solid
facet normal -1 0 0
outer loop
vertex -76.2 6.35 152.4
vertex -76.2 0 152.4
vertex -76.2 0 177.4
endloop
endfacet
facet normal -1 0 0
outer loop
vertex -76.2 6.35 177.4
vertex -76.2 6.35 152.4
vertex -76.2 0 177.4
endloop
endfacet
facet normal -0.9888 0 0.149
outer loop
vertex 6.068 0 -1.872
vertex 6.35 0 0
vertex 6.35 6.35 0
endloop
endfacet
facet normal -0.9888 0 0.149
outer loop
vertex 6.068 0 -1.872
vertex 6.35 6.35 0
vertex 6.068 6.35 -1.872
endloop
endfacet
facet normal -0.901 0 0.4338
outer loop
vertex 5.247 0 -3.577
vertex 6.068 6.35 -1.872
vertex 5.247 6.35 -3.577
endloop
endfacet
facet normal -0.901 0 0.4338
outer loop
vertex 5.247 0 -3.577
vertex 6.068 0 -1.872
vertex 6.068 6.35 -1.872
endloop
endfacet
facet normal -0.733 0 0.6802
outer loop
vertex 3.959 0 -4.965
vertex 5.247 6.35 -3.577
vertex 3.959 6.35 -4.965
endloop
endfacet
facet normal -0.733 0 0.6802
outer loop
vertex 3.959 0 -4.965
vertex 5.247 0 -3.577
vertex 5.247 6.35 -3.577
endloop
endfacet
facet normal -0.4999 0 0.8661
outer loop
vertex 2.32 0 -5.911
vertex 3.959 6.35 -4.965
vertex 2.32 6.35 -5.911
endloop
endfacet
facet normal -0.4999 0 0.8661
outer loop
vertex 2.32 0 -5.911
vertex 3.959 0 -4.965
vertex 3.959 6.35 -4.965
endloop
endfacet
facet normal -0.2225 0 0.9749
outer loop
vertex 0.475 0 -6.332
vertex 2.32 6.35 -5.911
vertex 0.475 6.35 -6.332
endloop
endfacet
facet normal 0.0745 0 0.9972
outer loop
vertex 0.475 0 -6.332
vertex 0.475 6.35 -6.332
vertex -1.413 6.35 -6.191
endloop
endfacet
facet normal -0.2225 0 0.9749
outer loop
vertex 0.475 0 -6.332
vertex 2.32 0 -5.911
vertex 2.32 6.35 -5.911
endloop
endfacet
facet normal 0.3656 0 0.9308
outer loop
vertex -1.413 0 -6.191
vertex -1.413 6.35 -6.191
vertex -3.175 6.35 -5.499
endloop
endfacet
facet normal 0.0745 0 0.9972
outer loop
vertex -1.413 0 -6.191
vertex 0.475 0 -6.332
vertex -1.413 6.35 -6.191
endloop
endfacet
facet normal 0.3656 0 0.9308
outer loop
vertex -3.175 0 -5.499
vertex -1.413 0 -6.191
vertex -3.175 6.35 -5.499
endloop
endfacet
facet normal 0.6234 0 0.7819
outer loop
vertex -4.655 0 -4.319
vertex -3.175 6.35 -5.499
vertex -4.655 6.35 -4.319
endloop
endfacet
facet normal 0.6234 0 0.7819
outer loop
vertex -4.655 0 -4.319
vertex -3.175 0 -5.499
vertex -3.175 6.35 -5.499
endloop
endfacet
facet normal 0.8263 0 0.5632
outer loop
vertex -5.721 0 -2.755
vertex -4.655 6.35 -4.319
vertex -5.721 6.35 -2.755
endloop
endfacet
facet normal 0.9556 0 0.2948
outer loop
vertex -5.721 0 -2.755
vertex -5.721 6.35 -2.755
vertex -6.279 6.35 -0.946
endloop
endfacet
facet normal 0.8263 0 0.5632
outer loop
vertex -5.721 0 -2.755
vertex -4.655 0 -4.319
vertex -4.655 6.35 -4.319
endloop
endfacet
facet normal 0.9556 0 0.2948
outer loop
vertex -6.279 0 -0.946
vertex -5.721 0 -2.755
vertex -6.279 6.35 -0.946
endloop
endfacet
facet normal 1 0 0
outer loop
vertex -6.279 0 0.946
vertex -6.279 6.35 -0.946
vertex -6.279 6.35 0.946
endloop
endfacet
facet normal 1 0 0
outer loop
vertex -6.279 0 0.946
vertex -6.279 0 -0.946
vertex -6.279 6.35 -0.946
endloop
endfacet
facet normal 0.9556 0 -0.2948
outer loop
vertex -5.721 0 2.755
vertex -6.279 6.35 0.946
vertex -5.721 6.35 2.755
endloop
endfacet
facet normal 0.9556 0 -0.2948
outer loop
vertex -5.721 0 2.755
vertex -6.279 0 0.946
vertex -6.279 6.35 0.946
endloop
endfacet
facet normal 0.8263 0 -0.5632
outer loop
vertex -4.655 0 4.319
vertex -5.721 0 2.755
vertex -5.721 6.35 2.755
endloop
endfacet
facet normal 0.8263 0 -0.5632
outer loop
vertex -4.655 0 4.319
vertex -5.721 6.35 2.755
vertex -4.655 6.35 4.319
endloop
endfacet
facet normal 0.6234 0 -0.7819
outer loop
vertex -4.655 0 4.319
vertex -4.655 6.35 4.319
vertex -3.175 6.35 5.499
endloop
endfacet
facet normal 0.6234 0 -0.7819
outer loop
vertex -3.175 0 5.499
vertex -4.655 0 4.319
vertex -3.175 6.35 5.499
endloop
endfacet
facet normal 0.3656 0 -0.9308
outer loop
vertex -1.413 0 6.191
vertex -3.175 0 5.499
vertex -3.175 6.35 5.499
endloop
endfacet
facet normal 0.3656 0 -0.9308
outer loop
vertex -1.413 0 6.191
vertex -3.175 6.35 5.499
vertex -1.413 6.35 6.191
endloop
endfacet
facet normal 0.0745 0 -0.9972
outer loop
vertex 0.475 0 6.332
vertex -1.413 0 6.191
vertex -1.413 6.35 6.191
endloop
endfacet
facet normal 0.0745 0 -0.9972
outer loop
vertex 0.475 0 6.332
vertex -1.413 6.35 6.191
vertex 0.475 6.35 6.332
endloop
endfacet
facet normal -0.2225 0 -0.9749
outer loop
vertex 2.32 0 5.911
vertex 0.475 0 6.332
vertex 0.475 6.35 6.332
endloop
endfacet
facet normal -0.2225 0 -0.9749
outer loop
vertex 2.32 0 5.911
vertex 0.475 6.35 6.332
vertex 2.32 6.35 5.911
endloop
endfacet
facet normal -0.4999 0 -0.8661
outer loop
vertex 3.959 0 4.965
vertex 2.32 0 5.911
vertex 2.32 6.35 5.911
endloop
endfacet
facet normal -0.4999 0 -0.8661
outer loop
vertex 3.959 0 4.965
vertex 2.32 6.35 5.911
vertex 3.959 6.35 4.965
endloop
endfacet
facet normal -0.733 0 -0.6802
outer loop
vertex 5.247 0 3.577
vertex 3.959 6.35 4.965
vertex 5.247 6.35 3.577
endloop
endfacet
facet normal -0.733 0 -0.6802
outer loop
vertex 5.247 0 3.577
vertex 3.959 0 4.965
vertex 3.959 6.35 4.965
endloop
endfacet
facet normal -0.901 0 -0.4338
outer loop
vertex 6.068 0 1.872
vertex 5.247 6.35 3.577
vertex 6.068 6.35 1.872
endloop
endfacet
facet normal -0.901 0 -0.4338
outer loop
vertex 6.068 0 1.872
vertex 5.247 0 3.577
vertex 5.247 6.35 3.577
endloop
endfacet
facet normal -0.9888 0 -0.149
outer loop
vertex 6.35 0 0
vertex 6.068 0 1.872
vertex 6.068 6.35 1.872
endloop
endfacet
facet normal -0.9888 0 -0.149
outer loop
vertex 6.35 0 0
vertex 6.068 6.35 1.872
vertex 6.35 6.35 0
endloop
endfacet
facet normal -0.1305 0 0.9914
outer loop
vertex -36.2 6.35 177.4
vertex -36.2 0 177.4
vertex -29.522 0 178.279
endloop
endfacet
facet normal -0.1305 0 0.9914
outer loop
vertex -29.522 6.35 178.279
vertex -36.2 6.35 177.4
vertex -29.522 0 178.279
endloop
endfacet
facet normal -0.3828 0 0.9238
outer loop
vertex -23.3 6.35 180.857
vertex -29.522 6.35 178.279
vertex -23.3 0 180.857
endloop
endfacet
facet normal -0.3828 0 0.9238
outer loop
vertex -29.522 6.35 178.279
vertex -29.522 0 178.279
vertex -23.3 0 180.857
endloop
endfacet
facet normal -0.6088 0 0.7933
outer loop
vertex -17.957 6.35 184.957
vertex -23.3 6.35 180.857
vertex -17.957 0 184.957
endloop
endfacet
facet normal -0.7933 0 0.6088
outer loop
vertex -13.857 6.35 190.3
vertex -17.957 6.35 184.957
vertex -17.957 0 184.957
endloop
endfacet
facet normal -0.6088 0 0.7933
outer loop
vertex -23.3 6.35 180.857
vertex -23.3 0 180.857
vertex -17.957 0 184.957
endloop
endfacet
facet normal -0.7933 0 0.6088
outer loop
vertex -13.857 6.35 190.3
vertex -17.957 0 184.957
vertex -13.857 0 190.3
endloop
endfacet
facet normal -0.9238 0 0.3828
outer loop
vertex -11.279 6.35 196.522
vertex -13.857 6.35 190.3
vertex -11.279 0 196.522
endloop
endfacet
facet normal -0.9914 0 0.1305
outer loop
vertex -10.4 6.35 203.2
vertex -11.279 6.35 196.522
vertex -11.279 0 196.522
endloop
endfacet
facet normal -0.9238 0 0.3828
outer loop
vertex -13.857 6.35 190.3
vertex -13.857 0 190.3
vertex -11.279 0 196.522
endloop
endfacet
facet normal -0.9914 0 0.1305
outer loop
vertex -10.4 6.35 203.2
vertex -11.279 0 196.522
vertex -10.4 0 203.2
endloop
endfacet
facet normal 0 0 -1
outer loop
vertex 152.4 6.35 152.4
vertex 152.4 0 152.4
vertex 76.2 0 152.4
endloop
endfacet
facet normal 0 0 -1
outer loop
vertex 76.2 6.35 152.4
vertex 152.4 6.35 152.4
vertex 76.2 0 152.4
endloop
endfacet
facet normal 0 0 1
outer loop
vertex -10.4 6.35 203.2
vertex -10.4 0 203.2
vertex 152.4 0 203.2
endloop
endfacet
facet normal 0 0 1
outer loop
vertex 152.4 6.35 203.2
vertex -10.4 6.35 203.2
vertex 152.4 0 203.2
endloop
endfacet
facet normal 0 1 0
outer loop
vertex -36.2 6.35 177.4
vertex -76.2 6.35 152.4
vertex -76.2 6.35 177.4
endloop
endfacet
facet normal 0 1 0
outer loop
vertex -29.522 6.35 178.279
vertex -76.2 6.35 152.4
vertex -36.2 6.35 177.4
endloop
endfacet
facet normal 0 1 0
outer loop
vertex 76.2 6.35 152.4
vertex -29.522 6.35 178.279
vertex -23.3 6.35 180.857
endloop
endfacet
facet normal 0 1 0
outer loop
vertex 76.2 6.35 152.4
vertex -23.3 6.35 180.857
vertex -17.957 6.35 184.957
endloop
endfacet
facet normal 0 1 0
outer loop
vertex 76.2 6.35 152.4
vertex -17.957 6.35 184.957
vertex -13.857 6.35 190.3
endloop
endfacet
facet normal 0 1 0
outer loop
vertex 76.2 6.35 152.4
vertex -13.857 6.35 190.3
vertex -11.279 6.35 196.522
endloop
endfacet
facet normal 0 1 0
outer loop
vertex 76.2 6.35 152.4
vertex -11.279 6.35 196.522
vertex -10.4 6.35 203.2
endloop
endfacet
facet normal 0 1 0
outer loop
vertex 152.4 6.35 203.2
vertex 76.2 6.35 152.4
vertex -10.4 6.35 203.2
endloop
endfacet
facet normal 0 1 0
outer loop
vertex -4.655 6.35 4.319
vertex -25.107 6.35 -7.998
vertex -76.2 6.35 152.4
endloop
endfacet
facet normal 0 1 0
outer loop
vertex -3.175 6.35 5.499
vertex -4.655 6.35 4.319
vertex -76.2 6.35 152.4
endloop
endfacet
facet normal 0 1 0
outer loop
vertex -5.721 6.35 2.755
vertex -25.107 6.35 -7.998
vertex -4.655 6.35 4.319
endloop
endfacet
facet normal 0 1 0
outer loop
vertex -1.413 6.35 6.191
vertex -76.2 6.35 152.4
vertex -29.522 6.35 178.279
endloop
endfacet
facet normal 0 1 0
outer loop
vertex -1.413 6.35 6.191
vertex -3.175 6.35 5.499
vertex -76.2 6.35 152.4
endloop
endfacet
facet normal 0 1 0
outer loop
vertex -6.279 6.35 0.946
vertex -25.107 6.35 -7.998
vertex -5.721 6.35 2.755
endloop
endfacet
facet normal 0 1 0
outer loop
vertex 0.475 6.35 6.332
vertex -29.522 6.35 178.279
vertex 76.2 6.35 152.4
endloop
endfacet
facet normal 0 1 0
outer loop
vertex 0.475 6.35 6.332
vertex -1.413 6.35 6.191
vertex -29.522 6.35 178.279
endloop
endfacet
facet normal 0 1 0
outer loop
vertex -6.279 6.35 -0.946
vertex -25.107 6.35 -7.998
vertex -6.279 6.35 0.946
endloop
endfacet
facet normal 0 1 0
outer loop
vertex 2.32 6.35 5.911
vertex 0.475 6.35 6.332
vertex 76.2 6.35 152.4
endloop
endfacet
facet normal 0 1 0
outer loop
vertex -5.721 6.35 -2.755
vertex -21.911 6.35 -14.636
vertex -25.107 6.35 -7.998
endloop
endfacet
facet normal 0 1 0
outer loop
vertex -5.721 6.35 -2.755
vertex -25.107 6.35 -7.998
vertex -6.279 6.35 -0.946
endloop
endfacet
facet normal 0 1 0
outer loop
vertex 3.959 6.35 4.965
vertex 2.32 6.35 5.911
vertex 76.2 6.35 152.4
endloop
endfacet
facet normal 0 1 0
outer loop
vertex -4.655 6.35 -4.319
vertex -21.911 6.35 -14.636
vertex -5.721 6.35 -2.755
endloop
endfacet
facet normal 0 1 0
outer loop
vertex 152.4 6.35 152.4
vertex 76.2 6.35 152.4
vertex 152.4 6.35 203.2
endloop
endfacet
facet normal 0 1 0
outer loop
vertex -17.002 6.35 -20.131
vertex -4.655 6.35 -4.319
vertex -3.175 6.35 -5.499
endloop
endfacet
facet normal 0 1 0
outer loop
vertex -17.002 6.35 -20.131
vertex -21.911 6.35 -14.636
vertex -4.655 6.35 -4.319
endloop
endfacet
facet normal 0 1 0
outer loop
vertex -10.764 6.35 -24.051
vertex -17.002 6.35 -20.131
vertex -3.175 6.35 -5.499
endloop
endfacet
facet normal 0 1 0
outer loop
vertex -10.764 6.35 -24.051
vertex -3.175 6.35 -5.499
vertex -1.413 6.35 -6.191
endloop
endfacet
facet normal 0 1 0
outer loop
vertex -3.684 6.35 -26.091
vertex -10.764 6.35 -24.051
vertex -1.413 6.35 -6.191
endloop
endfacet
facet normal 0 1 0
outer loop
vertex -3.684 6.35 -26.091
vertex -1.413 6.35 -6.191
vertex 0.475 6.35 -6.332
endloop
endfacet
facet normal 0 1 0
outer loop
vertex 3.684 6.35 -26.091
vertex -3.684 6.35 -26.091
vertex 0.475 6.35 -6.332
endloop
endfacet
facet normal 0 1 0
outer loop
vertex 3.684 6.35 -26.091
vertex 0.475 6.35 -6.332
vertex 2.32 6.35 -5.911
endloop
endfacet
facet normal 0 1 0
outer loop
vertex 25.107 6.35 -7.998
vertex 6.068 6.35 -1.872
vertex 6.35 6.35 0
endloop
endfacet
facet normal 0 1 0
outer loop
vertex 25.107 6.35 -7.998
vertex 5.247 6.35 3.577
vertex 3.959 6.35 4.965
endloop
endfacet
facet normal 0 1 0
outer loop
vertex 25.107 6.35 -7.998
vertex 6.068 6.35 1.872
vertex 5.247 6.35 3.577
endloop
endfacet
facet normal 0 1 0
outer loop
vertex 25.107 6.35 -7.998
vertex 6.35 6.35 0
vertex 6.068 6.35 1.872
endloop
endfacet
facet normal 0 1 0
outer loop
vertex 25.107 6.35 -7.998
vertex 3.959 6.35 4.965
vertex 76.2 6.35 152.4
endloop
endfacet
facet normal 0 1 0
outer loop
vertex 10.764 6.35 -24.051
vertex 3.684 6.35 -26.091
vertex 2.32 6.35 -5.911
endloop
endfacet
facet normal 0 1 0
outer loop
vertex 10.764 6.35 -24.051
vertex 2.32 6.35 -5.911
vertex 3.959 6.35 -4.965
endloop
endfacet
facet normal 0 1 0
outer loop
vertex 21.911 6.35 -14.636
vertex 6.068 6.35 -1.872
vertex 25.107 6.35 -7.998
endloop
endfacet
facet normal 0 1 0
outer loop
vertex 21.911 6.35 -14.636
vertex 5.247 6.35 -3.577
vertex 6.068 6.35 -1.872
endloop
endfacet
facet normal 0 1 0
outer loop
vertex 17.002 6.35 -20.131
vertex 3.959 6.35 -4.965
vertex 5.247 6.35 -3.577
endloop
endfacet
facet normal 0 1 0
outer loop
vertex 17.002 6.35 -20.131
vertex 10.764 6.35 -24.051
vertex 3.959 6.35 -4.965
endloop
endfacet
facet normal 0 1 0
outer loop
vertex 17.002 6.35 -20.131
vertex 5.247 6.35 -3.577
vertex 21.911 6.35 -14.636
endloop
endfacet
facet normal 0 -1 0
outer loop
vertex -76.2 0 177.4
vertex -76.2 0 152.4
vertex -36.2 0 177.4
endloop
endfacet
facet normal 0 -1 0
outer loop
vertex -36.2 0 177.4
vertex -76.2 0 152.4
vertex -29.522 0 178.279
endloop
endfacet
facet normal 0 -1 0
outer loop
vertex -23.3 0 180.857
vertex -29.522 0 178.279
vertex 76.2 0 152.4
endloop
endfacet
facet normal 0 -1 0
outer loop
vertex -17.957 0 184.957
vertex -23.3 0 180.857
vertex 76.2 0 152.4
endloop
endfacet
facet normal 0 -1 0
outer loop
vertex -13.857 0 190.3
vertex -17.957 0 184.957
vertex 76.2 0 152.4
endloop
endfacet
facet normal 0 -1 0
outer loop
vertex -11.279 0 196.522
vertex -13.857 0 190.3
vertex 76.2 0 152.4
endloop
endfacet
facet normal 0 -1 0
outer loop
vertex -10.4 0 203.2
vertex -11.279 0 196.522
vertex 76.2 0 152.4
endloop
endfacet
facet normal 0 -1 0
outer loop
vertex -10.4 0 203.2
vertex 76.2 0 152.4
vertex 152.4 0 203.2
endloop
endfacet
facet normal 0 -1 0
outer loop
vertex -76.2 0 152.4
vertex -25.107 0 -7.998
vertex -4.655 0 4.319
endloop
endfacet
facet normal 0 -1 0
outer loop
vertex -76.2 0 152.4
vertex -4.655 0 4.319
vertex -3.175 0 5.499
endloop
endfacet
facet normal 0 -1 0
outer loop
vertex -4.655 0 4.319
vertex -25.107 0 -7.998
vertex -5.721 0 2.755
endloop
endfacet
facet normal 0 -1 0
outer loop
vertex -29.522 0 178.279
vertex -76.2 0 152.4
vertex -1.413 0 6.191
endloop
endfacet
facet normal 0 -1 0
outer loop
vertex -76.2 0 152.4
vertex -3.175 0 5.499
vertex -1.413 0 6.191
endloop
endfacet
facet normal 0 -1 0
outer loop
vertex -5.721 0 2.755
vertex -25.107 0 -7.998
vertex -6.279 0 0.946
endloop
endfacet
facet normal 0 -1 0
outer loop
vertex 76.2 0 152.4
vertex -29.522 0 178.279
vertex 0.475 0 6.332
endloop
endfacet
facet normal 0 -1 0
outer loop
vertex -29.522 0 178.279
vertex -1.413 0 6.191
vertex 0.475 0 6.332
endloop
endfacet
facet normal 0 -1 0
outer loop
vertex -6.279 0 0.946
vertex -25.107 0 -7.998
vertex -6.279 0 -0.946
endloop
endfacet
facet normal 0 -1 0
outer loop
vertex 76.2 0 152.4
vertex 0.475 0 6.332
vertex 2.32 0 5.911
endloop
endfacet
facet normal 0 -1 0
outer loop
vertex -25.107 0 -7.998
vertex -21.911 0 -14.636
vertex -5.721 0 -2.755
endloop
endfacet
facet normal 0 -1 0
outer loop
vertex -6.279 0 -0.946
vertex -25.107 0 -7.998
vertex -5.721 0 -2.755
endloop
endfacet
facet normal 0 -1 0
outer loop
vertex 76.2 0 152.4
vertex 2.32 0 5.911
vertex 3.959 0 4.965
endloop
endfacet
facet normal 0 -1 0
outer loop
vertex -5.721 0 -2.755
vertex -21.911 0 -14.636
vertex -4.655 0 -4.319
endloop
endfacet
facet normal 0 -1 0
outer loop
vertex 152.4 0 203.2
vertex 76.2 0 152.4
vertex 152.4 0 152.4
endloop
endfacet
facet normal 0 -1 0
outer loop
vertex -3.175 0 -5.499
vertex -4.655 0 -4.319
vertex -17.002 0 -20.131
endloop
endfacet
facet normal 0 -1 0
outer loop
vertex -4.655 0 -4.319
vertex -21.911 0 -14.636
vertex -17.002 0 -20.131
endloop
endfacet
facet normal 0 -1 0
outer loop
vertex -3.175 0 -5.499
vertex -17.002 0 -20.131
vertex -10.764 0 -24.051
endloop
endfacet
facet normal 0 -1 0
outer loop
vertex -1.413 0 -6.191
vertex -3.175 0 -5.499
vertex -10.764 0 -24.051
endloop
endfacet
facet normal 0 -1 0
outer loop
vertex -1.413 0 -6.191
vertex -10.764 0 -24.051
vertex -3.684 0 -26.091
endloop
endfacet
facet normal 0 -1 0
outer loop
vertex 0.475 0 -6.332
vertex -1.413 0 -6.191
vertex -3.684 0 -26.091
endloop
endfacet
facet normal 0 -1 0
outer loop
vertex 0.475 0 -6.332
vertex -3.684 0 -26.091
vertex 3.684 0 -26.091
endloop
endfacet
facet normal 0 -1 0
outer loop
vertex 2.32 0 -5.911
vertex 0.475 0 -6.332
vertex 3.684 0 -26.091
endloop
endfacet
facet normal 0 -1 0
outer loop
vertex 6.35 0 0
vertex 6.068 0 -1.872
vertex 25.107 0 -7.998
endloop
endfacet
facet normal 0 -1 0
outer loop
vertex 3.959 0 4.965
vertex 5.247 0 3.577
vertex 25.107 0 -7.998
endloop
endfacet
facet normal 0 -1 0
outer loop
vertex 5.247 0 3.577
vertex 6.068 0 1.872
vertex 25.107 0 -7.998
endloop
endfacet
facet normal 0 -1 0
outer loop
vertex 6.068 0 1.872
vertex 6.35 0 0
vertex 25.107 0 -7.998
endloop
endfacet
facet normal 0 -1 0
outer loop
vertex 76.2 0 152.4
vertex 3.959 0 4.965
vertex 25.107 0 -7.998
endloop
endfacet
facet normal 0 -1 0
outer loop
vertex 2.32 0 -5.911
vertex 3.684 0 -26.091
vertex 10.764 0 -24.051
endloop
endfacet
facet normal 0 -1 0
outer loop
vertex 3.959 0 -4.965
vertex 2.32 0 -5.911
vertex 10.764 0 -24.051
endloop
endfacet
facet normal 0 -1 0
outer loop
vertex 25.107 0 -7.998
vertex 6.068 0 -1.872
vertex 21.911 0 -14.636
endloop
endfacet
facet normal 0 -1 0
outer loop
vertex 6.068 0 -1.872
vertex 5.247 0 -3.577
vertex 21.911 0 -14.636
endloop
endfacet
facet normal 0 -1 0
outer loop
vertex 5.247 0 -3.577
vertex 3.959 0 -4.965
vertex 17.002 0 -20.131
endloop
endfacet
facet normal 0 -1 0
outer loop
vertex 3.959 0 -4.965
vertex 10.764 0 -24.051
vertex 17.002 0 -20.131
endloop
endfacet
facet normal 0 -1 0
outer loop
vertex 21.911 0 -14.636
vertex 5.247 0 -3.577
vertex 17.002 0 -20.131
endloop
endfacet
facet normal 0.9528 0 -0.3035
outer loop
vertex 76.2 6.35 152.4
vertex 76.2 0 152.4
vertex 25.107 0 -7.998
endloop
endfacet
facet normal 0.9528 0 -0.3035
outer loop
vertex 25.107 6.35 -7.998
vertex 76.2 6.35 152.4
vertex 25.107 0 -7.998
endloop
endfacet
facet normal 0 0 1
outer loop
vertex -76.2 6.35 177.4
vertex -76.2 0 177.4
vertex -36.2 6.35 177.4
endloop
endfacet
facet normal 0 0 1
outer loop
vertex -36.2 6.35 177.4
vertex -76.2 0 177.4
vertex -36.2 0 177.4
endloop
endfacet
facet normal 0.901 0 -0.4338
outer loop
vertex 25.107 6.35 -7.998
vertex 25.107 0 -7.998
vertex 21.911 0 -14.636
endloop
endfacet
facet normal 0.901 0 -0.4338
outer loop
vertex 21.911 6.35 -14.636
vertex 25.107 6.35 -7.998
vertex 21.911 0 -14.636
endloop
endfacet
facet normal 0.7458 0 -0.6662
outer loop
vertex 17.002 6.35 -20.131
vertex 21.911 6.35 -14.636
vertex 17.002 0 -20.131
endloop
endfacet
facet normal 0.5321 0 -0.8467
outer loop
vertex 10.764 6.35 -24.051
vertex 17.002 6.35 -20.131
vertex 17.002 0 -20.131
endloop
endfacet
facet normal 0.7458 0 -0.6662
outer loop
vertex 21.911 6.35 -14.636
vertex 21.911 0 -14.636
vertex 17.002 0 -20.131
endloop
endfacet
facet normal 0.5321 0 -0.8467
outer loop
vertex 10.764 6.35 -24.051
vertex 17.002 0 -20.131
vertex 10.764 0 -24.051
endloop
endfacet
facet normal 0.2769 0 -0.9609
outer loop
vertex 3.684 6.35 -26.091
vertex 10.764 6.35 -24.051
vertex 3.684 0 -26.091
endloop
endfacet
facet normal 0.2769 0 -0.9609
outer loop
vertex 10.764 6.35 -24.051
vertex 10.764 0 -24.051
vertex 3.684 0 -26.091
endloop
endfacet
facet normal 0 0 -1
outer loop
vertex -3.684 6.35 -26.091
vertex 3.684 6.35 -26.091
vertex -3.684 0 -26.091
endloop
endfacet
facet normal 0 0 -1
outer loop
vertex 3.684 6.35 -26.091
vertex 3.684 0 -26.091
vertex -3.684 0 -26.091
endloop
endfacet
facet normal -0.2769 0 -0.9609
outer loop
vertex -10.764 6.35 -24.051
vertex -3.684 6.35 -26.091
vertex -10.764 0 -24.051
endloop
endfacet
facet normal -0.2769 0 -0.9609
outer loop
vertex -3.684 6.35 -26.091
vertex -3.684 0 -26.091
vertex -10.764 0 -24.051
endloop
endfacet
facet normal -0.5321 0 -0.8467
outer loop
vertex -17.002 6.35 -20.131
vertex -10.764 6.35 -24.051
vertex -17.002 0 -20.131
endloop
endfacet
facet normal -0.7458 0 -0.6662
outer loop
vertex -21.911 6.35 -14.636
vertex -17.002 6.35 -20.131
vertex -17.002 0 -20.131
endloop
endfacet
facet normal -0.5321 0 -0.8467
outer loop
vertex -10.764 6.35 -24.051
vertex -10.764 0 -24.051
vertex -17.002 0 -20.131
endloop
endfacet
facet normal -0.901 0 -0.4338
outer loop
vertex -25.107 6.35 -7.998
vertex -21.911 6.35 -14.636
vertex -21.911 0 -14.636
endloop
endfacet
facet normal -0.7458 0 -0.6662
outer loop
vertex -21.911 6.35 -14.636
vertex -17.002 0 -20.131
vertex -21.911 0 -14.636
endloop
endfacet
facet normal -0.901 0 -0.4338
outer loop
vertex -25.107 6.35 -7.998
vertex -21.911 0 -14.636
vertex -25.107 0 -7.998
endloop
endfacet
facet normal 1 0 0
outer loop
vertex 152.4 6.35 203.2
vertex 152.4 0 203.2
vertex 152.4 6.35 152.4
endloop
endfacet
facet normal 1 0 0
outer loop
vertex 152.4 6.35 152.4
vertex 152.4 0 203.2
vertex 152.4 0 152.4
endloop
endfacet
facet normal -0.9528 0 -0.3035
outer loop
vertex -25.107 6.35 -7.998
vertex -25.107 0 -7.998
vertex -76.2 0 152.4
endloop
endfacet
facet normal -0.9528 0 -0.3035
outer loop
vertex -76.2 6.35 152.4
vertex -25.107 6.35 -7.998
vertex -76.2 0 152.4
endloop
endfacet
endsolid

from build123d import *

# Parameters (mm, degrees)
SKETCH1_R           = 6.35
BOSS_EXTRUDE1_DEPTH = 6.35


with BuildPart() as part:
    # Sketch1 → Boss-Extrude1 (new body)
    with BuildSketch(Plane(origin=(0, 0, 0), x_dir=(1, 0, 0), z_dir=(0, 1, 0))):
        with BuildLine():
            Line((76.2, -152.4), (25.106996492, 7.99757633))
            ThreePointArc((25.106996492, 7.99757633), (0, 26.35), (-25.106996492, 7.99757633))
            Line((-25.106996492, 7.99757633), (-76.2, -152.4))
            Line((-76.2, -152.4), (-76.2, -177.4))
            Line((-76.2, -177.4), (-36.2, -177.4))
            ThreePointArc((-36.2, -177.4), (-17.956645045, -184.956645045), (-10.4, -203.2))
            Line((-10.4, -203.2), (152.4, -203.2))
            Line((152.4, -203.2), (152.4, -152.4))
            Line((152.4, -152.4), (76.2, -152.4))
        make_face()
        Circle(SKETCH1_R, mode=Mode.SUBTRACT)
    extrude(amount=BOSS_EXTRUDE1_DEPTH)


solid = part.part
